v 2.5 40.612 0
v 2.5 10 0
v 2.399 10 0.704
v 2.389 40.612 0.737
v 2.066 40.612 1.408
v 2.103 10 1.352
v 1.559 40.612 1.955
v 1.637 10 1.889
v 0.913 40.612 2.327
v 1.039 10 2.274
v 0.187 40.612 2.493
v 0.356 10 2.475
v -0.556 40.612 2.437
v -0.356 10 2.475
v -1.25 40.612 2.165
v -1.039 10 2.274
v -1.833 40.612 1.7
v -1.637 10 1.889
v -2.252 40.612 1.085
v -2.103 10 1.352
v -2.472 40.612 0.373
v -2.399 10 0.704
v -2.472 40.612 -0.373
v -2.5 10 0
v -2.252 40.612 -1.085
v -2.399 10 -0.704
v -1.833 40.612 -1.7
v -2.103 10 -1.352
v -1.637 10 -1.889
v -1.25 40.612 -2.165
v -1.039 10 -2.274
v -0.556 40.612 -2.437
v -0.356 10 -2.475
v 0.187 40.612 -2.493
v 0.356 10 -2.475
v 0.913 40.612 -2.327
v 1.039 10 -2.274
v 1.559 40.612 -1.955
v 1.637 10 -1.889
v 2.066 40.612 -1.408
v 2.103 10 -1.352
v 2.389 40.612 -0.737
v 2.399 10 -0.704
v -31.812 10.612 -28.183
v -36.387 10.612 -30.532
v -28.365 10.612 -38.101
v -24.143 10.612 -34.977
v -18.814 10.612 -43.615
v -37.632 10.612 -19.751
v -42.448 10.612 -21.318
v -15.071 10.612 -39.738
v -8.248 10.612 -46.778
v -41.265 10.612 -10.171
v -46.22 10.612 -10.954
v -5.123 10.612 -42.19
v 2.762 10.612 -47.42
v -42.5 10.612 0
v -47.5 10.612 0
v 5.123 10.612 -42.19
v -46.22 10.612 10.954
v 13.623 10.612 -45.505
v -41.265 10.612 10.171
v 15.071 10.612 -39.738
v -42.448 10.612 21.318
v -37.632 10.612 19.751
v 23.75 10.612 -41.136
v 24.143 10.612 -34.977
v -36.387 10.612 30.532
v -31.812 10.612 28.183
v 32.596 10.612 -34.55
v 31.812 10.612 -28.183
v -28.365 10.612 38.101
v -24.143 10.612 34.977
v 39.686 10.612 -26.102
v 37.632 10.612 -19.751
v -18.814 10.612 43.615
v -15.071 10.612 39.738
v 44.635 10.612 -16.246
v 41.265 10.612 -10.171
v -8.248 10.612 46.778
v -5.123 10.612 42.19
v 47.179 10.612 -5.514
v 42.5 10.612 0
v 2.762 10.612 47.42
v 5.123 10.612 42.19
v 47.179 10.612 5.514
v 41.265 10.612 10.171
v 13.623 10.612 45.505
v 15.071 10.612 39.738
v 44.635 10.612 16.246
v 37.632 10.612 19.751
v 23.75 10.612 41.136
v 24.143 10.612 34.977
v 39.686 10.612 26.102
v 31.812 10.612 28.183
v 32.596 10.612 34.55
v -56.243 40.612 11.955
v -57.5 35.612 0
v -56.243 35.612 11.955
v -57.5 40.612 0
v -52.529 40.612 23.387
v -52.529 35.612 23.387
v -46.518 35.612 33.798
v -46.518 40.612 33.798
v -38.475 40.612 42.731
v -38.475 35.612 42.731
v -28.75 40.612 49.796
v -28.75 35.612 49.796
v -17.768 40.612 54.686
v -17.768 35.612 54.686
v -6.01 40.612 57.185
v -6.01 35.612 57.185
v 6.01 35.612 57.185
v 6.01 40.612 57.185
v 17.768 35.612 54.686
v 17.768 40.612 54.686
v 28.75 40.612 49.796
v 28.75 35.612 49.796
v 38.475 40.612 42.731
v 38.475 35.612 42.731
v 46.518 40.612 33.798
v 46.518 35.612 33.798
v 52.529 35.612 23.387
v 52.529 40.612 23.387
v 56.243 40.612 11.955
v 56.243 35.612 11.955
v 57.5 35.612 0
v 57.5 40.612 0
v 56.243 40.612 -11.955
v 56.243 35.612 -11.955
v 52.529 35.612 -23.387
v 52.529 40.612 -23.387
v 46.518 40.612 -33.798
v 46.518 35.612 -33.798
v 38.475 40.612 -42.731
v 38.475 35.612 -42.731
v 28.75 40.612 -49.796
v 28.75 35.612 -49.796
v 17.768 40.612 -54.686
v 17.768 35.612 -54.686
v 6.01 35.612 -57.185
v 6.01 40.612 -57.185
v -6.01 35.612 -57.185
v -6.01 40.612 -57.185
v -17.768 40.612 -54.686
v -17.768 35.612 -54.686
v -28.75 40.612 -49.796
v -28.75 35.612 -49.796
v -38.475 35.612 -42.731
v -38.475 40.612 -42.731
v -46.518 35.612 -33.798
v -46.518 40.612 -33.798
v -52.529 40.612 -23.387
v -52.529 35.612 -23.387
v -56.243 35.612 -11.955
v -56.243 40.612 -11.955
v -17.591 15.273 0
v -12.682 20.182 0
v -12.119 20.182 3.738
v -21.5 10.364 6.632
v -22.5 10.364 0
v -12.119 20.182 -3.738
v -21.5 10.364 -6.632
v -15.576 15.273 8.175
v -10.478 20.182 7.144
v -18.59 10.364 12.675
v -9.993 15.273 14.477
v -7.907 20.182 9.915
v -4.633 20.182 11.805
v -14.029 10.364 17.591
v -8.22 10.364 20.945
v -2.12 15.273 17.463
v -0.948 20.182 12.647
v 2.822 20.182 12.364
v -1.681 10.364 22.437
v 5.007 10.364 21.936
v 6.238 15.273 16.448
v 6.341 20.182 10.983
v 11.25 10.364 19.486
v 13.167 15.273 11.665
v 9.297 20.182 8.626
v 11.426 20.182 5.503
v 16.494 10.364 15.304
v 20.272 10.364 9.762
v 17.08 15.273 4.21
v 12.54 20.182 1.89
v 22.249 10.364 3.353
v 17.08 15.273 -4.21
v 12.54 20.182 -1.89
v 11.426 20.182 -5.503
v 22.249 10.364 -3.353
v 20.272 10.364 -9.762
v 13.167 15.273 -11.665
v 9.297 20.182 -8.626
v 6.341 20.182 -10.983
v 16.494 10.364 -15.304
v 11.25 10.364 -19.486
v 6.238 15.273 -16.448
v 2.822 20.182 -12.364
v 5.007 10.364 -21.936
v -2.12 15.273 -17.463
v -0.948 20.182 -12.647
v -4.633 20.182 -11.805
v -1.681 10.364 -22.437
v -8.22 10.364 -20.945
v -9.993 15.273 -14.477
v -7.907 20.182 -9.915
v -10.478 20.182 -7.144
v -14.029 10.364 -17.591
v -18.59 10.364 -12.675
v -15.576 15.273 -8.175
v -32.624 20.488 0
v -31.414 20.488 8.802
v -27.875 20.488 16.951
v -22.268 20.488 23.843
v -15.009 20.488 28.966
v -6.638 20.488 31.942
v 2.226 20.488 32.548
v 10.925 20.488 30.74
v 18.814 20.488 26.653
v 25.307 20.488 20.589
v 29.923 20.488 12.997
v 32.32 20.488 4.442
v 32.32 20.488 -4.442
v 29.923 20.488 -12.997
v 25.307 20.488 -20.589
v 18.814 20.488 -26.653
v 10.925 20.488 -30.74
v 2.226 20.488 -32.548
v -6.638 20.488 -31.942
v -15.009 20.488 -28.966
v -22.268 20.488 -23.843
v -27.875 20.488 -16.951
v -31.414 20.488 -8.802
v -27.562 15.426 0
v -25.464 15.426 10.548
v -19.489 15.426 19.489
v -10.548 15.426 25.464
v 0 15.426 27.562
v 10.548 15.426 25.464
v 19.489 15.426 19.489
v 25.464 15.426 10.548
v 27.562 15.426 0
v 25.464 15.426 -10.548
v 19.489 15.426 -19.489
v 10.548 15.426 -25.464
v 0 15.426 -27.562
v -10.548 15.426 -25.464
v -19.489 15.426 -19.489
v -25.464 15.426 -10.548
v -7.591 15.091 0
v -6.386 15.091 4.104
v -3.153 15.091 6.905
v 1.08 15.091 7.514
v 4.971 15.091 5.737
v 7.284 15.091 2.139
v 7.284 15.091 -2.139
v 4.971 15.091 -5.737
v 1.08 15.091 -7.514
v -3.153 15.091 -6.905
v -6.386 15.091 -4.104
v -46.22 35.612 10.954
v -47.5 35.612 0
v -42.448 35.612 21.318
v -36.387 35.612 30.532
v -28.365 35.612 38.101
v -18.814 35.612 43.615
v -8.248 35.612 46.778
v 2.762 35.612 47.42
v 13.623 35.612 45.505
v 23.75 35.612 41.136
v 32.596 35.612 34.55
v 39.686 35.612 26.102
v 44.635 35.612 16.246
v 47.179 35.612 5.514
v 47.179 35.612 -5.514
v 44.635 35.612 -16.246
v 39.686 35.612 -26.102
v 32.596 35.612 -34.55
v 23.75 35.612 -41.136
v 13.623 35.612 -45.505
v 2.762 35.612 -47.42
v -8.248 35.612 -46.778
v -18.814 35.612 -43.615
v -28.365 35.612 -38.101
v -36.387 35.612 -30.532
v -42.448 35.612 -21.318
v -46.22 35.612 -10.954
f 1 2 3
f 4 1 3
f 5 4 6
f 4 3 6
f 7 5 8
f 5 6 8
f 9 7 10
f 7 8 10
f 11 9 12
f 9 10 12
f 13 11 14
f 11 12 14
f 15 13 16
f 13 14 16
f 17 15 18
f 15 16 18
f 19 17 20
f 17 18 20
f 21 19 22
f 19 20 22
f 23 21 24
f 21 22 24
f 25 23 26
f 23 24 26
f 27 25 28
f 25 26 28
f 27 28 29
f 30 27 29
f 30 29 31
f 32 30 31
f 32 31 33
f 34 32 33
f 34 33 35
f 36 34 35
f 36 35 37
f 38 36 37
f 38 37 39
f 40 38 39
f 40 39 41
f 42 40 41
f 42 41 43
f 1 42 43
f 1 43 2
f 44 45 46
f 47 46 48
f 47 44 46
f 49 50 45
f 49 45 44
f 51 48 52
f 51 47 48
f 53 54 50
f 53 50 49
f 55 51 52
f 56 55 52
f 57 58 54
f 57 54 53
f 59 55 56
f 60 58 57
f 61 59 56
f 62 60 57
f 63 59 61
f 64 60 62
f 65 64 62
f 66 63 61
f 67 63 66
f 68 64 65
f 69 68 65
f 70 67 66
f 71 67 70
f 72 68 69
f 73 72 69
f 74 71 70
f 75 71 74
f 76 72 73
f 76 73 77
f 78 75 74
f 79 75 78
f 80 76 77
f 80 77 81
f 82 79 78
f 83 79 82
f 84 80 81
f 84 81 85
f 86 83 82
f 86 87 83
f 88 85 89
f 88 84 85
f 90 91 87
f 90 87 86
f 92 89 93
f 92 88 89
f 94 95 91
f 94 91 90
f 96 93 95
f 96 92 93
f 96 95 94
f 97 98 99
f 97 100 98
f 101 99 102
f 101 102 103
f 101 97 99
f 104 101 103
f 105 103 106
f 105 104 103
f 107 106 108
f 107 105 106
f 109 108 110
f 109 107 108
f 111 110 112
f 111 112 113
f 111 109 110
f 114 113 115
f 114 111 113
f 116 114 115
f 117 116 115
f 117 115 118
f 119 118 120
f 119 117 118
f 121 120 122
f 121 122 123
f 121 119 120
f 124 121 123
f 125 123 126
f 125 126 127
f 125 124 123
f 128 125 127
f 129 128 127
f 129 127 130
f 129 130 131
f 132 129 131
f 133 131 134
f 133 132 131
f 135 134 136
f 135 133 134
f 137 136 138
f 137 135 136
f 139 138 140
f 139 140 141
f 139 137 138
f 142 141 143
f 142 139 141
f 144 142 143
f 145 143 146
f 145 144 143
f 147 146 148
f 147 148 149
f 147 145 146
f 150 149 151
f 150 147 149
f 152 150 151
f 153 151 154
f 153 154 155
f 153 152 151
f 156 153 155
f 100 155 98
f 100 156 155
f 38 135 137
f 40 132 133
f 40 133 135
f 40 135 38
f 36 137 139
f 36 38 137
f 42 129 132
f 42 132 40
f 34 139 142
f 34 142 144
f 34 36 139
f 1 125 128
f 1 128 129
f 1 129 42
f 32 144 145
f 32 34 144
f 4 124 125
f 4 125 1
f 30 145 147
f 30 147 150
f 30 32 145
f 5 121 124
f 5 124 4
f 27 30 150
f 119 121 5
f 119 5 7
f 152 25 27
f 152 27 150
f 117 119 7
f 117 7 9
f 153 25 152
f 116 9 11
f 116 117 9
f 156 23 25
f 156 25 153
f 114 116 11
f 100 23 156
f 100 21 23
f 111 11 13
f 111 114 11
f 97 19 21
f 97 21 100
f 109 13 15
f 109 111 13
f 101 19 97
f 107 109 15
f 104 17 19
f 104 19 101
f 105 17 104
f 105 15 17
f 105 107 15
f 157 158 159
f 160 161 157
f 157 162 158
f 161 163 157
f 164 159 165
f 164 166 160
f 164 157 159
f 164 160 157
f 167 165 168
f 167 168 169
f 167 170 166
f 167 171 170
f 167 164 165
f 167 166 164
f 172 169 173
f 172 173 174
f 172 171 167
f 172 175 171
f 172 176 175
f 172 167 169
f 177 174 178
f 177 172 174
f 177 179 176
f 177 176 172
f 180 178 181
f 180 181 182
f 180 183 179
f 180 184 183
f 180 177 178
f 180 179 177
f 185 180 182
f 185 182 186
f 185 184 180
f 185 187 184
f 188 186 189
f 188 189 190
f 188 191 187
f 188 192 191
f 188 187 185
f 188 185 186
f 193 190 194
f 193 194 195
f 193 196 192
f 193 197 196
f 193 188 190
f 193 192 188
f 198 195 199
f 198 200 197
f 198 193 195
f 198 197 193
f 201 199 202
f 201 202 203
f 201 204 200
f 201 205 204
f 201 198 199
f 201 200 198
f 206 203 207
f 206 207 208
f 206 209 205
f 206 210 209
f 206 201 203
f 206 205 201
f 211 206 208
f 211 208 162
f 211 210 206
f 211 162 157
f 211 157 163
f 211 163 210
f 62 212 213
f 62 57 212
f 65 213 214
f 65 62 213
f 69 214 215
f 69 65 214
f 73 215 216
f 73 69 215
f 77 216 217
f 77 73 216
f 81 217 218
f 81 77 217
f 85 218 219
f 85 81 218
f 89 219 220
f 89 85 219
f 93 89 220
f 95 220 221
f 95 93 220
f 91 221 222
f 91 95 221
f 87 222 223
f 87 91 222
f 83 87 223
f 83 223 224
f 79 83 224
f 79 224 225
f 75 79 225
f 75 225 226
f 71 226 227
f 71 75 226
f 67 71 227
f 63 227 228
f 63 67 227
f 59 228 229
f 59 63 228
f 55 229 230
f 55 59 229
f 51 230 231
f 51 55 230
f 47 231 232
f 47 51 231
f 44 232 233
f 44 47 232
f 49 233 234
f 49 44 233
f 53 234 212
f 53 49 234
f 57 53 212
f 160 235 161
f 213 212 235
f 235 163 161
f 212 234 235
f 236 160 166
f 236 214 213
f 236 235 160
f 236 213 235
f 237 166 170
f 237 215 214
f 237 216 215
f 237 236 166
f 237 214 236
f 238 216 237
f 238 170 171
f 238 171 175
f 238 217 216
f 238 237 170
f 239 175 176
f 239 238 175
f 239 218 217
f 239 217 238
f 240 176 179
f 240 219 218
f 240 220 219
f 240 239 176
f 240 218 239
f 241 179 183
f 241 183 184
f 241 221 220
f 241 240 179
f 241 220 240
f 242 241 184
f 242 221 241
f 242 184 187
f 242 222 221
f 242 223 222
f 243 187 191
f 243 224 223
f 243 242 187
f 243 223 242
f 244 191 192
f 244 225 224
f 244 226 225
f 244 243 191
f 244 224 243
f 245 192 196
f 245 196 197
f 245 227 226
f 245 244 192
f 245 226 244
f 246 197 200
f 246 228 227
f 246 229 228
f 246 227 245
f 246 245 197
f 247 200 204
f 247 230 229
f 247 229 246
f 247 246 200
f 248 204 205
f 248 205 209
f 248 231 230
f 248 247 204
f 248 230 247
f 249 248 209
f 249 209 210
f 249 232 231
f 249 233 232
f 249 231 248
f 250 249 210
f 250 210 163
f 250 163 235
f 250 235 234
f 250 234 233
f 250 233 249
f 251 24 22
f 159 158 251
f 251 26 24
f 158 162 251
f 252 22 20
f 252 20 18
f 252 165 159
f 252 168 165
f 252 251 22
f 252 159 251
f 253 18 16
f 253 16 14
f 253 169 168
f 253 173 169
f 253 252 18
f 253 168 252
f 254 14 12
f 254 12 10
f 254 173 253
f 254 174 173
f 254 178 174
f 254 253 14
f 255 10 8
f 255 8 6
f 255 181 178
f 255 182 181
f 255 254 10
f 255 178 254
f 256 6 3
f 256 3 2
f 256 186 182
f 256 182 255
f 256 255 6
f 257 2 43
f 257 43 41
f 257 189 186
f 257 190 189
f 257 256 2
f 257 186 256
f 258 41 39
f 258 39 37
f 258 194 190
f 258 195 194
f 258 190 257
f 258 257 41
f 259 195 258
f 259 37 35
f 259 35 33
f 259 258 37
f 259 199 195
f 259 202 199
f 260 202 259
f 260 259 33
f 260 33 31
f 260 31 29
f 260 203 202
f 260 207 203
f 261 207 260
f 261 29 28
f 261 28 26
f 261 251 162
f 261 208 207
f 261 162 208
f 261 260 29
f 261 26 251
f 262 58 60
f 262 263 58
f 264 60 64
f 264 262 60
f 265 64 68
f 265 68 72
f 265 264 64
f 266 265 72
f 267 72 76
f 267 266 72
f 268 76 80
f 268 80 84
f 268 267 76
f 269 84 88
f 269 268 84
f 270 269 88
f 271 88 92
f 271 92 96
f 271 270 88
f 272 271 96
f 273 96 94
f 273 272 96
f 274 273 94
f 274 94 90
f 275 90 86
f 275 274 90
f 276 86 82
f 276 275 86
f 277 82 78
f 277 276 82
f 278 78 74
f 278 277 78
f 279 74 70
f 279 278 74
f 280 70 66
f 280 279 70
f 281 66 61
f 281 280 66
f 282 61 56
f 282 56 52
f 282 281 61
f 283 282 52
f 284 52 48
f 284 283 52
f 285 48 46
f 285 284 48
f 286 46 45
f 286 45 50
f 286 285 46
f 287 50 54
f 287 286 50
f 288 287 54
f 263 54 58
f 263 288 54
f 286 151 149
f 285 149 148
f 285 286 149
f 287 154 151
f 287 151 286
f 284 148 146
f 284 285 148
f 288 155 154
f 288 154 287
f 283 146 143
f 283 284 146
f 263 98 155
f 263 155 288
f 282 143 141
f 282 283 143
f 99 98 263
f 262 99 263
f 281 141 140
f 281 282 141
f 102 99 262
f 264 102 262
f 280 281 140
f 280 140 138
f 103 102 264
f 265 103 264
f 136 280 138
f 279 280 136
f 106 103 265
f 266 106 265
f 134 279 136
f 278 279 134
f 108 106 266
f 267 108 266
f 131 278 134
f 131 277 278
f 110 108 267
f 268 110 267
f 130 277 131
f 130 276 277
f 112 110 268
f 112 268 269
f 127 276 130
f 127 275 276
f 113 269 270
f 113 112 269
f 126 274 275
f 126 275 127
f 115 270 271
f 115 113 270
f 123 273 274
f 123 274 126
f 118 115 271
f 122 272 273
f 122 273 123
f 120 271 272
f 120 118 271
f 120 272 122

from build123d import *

# Parameters (mm, degrees)
SKETCH2_R          = 2.5
CUT_EXTRUDE1_DEPTH = 40


with BuildPart() as part:
    # Sketch1 → Revolve1 (revolve)
    with BuildSketch(Plane.XY):
        Polygon((0, 10), (-2.5, 10), (-12.682056098, 20.182056098), (-22.5, 10.364112197), (-32.623909355, 20.488021552), (-42.5, 10.611930908), (-47.5, 10.611930908), (-47.5, 35.611930908), (-57.5, 35.611930908), (-57.5, 40.611930908), (0, 40.611930908), align=None)
    revolve(axis=Axis((0, 40.611930908, 0), (0, 1, 0)))

    # Sketch2 → Cut-Extrude1 (cut)
    with BuildSketch(Plane.XZ.offset(-10)):
        Circle(SKETCH2_R)
    extrude(amount=-CUT_EXTRUDE1_DEPTH, mode=Mode.SUBTRACT)


solid = part.part
